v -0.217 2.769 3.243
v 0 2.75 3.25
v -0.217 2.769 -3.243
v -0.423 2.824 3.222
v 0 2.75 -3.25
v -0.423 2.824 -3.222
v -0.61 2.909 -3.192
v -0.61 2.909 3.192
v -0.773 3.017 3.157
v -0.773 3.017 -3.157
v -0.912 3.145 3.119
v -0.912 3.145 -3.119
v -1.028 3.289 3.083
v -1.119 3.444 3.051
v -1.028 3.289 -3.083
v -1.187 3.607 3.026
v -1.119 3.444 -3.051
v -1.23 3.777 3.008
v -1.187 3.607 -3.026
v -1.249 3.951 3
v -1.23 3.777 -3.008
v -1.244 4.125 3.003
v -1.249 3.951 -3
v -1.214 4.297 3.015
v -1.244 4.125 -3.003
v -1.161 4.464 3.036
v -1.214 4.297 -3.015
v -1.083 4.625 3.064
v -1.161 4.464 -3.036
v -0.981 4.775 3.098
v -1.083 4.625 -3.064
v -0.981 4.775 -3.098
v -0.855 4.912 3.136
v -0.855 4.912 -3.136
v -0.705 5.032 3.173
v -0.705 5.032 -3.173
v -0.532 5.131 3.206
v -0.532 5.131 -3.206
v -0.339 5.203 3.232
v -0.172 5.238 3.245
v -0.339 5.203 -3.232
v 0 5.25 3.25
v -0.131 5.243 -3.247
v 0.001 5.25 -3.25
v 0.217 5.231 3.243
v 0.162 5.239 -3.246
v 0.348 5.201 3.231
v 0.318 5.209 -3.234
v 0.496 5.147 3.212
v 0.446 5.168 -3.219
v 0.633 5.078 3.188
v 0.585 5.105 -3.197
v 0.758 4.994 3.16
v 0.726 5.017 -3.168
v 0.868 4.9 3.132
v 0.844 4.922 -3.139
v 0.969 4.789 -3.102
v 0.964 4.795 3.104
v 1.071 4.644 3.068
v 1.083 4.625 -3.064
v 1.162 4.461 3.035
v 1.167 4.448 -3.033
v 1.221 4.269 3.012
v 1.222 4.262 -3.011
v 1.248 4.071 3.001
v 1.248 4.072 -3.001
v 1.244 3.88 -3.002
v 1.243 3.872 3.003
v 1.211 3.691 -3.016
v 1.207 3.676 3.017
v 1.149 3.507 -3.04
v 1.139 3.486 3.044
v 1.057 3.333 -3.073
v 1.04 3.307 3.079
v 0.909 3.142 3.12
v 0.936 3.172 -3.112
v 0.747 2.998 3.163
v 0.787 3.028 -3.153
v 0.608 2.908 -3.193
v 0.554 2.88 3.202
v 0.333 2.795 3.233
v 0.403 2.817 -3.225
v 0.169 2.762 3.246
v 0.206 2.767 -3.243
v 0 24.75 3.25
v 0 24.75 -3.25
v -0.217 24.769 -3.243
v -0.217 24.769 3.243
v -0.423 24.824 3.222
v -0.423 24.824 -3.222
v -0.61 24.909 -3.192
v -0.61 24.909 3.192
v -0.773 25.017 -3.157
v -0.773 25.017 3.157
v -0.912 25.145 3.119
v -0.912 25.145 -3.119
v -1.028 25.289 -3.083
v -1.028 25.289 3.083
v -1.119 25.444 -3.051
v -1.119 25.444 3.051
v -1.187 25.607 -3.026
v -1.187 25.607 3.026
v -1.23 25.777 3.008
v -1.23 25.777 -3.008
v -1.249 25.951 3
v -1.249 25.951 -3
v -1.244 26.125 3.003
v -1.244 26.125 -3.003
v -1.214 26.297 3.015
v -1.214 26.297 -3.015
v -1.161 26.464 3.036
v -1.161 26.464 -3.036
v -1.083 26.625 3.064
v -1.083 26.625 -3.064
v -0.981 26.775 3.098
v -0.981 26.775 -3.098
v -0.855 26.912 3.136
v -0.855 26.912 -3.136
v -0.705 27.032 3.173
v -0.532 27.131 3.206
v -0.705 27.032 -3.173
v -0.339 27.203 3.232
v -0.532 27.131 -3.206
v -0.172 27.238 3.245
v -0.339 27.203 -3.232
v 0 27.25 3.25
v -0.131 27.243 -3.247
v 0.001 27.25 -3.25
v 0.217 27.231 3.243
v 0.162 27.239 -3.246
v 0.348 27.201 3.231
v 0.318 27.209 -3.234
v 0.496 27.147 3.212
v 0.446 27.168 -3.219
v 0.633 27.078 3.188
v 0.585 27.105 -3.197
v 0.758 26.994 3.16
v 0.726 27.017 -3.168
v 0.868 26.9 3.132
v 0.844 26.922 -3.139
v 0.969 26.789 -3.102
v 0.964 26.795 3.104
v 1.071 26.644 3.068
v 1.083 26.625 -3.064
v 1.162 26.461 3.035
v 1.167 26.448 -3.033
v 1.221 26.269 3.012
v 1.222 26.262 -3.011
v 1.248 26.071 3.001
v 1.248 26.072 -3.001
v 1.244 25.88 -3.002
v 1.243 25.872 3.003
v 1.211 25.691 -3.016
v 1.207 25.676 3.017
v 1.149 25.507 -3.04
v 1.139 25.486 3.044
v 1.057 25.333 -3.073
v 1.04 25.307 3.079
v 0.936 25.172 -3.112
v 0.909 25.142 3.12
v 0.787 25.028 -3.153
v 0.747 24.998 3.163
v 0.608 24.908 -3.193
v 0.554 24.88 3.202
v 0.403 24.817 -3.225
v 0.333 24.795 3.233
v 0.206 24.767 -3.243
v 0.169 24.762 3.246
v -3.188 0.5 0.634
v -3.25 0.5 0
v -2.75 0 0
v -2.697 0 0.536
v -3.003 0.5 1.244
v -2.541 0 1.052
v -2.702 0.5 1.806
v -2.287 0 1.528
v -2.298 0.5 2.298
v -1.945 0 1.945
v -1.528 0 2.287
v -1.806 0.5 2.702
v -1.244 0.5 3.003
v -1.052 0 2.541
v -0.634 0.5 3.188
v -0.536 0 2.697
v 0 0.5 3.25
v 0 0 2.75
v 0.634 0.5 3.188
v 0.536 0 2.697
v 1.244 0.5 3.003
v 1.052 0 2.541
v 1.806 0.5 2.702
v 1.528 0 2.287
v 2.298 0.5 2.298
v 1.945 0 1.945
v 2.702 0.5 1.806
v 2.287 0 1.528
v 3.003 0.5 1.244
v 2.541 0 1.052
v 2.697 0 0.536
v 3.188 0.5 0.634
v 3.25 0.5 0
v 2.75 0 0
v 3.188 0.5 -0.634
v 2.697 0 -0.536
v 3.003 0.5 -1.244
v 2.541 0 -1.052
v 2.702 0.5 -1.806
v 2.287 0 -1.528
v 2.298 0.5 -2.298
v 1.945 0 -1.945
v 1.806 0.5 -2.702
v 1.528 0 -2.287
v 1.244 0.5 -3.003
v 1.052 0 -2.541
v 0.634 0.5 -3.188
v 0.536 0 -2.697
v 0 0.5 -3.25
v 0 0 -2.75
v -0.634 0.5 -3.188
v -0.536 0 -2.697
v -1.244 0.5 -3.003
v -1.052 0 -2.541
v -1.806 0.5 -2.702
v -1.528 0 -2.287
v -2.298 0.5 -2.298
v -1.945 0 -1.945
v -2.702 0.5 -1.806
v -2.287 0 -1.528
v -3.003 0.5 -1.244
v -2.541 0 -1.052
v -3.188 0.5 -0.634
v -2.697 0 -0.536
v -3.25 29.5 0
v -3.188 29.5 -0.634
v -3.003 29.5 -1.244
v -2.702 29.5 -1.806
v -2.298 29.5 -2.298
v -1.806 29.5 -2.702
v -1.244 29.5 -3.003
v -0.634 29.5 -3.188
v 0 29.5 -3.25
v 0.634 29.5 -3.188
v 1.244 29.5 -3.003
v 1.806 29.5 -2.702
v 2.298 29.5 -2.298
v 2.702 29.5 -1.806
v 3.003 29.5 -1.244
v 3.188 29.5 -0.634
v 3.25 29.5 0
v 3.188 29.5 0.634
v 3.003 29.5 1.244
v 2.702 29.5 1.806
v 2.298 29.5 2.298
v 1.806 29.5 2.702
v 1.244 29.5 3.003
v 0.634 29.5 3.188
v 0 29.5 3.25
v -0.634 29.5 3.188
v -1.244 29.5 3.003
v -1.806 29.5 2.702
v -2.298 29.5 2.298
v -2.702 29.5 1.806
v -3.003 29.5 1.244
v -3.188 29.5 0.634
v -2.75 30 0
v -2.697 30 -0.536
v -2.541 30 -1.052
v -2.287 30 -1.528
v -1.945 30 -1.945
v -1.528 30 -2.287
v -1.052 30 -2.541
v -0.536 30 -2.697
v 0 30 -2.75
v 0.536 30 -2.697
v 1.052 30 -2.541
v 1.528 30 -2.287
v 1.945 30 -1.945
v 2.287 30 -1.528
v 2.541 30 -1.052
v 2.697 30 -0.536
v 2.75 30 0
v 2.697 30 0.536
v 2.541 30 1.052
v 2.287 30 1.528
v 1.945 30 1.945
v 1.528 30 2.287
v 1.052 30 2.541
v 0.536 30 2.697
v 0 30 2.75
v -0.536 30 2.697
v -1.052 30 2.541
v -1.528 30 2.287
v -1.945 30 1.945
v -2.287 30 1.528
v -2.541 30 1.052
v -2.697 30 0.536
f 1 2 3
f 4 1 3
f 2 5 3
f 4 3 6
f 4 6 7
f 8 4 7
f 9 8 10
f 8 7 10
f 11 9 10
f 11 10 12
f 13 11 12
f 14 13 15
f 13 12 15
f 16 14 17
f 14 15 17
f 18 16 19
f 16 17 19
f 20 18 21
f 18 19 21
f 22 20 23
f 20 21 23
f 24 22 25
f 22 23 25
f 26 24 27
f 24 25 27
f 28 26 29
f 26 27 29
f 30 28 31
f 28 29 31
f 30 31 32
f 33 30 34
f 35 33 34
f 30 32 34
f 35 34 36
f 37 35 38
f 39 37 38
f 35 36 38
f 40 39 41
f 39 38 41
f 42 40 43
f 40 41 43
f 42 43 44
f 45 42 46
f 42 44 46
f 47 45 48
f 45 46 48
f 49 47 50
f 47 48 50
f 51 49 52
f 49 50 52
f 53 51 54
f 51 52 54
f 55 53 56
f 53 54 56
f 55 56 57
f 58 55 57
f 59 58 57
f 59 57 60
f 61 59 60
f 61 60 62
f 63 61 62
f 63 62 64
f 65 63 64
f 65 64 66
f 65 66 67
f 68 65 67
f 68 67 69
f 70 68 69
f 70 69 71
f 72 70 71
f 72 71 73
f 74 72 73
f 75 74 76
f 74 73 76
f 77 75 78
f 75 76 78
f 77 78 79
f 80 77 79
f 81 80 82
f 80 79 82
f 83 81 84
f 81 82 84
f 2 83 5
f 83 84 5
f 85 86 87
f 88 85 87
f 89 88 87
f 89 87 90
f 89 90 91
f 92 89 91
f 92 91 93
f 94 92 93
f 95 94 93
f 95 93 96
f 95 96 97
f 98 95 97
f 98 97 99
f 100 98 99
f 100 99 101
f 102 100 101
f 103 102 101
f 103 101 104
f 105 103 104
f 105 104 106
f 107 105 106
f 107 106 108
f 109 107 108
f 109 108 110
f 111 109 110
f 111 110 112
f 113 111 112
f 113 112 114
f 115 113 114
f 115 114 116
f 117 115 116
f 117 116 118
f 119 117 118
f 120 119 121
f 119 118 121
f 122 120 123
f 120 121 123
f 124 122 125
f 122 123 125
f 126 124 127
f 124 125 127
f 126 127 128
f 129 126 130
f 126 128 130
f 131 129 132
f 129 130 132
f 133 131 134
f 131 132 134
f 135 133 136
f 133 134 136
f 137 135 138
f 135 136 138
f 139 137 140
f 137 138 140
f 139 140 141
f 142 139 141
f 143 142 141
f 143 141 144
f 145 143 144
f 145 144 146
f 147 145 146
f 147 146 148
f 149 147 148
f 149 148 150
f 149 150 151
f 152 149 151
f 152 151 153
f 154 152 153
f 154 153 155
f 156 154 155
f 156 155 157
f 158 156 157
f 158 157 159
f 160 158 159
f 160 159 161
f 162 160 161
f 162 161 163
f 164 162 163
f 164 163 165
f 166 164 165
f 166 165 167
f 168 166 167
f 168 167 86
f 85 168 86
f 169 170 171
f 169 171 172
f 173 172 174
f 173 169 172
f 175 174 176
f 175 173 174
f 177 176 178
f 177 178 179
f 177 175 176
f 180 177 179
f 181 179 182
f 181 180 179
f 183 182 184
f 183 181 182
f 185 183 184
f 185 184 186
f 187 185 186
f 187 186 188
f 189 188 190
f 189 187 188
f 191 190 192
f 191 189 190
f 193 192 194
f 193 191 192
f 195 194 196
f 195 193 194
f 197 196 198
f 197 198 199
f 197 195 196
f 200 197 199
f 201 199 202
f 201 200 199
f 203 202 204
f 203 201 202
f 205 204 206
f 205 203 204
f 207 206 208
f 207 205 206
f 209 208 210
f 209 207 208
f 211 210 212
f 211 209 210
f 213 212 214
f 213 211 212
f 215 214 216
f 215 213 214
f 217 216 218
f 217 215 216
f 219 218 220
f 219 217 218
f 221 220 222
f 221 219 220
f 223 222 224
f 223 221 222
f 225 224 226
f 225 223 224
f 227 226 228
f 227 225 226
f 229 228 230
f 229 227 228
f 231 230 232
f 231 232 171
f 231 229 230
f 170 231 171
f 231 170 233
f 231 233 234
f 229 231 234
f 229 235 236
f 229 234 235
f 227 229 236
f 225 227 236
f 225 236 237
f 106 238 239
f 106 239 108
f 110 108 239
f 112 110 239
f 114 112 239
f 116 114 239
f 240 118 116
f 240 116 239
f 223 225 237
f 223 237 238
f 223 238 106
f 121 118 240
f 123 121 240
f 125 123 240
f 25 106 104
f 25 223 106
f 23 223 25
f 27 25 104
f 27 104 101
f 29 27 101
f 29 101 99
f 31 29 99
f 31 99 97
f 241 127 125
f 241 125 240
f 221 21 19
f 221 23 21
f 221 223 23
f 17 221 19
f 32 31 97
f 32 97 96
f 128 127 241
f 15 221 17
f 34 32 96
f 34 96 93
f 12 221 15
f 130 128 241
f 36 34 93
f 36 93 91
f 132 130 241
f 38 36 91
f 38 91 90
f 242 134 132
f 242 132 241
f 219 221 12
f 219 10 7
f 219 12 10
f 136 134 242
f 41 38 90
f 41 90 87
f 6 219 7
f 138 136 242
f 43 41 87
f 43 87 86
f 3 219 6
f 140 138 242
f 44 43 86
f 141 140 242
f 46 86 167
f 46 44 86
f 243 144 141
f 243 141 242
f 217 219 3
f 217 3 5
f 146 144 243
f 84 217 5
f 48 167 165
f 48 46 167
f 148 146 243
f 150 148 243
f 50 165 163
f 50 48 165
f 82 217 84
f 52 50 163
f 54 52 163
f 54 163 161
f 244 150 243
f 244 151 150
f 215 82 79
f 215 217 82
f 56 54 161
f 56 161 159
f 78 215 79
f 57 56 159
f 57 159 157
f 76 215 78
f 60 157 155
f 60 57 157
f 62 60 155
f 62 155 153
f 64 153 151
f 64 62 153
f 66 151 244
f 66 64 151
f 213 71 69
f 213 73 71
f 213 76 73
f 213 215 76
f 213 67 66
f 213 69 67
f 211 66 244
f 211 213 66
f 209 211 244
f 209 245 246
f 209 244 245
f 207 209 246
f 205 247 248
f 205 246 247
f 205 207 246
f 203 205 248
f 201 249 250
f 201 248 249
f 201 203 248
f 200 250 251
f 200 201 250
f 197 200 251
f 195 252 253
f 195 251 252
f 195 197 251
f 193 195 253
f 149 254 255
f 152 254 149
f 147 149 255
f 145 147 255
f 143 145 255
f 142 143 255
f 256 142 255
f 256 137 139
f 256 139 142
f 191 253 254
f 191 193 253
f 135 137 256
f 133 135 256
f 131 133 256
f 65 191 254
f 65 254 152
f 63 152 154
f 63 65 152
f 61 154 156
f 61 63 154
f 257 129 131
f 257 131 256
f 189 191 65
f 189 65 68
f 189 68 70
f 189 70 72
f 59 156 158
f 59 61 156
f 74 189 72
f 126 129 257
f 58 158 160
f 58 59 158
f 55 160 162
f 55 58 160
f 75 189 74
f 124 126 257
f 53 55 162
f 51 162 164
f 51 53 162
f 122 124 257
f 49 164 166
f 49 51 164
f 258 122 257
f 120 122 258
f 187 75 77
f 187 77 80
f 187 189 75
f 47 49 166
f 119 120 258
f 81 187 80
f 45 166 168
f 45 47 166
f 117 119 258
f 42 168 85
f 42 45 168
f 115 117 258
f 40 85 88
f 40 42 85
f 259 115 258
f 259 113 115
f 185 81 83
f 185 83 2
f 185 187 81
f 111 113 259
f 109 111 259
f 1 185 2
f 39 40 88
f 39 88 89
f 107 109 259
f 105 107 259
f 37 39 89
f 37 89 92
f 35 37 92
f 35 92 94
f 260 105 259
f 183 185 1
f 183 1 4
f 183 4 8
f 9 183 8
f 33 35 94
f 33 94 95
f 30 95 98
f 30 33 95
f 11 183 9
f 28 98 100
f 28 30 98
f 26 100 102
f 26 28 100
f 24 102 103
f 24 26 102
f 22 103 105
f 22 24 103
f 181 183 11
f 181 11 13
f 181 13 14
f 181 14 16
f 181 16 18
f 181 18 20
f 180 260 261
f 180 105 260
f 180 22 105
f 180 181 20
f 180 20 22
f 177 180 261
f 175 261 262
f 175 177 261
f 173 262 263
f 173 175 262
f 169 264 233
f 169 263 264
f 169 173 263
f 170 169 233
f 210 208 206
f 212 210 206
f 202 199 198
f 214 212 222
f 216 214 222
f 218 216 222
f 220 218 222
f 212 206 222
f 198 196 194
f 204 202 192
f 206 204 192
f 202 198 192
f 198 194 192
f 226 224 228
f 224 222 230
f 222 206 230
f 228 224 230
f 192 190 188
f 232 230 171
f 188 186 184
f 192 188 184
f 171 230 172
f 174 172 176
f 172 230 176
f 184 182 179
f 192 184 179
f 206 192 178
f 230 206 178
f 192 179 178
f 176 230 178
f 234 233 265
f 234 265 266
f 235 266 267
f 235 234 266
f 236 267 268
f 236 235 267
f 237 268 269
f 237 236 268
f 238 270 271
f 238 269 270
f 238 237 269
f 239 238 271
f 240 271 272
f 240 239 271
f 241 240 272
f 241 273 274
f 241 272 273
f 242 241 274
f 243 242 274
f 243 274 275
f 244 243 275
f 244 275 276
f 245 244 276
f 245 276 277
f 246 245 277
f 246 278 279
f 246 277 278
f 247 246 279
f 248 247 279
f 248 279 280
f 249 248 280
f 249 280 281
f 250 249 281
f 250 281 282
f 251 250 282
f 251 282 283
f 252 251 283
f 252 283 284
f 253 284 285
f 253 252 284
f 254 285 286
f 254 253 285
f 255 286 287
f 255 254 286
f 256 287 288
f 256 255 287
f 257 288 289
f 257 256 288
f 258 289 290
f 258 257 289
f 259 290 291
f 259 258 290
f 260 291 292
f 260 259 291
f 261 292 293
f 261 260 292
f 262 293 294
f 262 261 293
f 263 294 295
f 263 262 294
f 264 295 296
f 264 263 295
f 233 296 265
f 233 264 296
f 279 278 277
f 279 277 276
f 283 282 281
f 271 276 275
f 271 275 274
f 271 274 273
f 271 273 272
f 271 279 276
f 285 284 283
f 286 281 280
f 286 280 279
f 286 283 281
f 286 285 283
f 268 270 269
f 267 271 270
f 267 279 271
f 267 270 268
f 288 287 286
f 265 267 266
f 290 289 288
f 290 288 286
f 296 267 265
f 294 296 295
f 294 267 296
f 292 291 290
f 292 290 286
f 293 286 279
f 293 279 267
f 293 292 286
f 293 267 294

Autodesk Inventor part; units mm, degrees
ref_plane "YZ Plane" through (0, 0, 0) normal (1, 0, 0) x (0, 1, 0)
ref_plane "XZ Plane" through (0, 0, 0) normal (0, 1, 0) x (-1, 0, 0)
sketch "Skizze1" plane through (0, 0, 0) normal (0, 1, 0) x (-1, 0, 0)
  circle A0 centre (0, 0) radius 3.25
  dimension "d0" = 6.5
extrude "Extrusion1" add sketch "Skizze1" along normal blind 30
chamfer "Fasen1" distance 0.5 angle 45 2 edges at (3.25, 30, 0) (3.25, 0, 0)
ref_plane "Arbeitsebene4" through (0, 0, 3.25) normal (0, 0, 1) x (1, 0, 0)
sketch "Skizze4" plane through (0, 0, 3.25) normal (0, 0, 1) x (1, 0, 0)
  line L0 (-2.75, 30) -> (2.75, 30) projected
  point P0 (0, 0)
  point P1 (0, 4)
  point P2 (0, 26)
  dimension "d25" = 4
  dimension "d26" = 4
hole "Bohrung3" at (0, 4, 3.25) at (0, 26, 3.25) direction (0, 0, -1) diameter 2.5 end through all
properties part number "BMS_bolts_left" material "Edelstahl"
